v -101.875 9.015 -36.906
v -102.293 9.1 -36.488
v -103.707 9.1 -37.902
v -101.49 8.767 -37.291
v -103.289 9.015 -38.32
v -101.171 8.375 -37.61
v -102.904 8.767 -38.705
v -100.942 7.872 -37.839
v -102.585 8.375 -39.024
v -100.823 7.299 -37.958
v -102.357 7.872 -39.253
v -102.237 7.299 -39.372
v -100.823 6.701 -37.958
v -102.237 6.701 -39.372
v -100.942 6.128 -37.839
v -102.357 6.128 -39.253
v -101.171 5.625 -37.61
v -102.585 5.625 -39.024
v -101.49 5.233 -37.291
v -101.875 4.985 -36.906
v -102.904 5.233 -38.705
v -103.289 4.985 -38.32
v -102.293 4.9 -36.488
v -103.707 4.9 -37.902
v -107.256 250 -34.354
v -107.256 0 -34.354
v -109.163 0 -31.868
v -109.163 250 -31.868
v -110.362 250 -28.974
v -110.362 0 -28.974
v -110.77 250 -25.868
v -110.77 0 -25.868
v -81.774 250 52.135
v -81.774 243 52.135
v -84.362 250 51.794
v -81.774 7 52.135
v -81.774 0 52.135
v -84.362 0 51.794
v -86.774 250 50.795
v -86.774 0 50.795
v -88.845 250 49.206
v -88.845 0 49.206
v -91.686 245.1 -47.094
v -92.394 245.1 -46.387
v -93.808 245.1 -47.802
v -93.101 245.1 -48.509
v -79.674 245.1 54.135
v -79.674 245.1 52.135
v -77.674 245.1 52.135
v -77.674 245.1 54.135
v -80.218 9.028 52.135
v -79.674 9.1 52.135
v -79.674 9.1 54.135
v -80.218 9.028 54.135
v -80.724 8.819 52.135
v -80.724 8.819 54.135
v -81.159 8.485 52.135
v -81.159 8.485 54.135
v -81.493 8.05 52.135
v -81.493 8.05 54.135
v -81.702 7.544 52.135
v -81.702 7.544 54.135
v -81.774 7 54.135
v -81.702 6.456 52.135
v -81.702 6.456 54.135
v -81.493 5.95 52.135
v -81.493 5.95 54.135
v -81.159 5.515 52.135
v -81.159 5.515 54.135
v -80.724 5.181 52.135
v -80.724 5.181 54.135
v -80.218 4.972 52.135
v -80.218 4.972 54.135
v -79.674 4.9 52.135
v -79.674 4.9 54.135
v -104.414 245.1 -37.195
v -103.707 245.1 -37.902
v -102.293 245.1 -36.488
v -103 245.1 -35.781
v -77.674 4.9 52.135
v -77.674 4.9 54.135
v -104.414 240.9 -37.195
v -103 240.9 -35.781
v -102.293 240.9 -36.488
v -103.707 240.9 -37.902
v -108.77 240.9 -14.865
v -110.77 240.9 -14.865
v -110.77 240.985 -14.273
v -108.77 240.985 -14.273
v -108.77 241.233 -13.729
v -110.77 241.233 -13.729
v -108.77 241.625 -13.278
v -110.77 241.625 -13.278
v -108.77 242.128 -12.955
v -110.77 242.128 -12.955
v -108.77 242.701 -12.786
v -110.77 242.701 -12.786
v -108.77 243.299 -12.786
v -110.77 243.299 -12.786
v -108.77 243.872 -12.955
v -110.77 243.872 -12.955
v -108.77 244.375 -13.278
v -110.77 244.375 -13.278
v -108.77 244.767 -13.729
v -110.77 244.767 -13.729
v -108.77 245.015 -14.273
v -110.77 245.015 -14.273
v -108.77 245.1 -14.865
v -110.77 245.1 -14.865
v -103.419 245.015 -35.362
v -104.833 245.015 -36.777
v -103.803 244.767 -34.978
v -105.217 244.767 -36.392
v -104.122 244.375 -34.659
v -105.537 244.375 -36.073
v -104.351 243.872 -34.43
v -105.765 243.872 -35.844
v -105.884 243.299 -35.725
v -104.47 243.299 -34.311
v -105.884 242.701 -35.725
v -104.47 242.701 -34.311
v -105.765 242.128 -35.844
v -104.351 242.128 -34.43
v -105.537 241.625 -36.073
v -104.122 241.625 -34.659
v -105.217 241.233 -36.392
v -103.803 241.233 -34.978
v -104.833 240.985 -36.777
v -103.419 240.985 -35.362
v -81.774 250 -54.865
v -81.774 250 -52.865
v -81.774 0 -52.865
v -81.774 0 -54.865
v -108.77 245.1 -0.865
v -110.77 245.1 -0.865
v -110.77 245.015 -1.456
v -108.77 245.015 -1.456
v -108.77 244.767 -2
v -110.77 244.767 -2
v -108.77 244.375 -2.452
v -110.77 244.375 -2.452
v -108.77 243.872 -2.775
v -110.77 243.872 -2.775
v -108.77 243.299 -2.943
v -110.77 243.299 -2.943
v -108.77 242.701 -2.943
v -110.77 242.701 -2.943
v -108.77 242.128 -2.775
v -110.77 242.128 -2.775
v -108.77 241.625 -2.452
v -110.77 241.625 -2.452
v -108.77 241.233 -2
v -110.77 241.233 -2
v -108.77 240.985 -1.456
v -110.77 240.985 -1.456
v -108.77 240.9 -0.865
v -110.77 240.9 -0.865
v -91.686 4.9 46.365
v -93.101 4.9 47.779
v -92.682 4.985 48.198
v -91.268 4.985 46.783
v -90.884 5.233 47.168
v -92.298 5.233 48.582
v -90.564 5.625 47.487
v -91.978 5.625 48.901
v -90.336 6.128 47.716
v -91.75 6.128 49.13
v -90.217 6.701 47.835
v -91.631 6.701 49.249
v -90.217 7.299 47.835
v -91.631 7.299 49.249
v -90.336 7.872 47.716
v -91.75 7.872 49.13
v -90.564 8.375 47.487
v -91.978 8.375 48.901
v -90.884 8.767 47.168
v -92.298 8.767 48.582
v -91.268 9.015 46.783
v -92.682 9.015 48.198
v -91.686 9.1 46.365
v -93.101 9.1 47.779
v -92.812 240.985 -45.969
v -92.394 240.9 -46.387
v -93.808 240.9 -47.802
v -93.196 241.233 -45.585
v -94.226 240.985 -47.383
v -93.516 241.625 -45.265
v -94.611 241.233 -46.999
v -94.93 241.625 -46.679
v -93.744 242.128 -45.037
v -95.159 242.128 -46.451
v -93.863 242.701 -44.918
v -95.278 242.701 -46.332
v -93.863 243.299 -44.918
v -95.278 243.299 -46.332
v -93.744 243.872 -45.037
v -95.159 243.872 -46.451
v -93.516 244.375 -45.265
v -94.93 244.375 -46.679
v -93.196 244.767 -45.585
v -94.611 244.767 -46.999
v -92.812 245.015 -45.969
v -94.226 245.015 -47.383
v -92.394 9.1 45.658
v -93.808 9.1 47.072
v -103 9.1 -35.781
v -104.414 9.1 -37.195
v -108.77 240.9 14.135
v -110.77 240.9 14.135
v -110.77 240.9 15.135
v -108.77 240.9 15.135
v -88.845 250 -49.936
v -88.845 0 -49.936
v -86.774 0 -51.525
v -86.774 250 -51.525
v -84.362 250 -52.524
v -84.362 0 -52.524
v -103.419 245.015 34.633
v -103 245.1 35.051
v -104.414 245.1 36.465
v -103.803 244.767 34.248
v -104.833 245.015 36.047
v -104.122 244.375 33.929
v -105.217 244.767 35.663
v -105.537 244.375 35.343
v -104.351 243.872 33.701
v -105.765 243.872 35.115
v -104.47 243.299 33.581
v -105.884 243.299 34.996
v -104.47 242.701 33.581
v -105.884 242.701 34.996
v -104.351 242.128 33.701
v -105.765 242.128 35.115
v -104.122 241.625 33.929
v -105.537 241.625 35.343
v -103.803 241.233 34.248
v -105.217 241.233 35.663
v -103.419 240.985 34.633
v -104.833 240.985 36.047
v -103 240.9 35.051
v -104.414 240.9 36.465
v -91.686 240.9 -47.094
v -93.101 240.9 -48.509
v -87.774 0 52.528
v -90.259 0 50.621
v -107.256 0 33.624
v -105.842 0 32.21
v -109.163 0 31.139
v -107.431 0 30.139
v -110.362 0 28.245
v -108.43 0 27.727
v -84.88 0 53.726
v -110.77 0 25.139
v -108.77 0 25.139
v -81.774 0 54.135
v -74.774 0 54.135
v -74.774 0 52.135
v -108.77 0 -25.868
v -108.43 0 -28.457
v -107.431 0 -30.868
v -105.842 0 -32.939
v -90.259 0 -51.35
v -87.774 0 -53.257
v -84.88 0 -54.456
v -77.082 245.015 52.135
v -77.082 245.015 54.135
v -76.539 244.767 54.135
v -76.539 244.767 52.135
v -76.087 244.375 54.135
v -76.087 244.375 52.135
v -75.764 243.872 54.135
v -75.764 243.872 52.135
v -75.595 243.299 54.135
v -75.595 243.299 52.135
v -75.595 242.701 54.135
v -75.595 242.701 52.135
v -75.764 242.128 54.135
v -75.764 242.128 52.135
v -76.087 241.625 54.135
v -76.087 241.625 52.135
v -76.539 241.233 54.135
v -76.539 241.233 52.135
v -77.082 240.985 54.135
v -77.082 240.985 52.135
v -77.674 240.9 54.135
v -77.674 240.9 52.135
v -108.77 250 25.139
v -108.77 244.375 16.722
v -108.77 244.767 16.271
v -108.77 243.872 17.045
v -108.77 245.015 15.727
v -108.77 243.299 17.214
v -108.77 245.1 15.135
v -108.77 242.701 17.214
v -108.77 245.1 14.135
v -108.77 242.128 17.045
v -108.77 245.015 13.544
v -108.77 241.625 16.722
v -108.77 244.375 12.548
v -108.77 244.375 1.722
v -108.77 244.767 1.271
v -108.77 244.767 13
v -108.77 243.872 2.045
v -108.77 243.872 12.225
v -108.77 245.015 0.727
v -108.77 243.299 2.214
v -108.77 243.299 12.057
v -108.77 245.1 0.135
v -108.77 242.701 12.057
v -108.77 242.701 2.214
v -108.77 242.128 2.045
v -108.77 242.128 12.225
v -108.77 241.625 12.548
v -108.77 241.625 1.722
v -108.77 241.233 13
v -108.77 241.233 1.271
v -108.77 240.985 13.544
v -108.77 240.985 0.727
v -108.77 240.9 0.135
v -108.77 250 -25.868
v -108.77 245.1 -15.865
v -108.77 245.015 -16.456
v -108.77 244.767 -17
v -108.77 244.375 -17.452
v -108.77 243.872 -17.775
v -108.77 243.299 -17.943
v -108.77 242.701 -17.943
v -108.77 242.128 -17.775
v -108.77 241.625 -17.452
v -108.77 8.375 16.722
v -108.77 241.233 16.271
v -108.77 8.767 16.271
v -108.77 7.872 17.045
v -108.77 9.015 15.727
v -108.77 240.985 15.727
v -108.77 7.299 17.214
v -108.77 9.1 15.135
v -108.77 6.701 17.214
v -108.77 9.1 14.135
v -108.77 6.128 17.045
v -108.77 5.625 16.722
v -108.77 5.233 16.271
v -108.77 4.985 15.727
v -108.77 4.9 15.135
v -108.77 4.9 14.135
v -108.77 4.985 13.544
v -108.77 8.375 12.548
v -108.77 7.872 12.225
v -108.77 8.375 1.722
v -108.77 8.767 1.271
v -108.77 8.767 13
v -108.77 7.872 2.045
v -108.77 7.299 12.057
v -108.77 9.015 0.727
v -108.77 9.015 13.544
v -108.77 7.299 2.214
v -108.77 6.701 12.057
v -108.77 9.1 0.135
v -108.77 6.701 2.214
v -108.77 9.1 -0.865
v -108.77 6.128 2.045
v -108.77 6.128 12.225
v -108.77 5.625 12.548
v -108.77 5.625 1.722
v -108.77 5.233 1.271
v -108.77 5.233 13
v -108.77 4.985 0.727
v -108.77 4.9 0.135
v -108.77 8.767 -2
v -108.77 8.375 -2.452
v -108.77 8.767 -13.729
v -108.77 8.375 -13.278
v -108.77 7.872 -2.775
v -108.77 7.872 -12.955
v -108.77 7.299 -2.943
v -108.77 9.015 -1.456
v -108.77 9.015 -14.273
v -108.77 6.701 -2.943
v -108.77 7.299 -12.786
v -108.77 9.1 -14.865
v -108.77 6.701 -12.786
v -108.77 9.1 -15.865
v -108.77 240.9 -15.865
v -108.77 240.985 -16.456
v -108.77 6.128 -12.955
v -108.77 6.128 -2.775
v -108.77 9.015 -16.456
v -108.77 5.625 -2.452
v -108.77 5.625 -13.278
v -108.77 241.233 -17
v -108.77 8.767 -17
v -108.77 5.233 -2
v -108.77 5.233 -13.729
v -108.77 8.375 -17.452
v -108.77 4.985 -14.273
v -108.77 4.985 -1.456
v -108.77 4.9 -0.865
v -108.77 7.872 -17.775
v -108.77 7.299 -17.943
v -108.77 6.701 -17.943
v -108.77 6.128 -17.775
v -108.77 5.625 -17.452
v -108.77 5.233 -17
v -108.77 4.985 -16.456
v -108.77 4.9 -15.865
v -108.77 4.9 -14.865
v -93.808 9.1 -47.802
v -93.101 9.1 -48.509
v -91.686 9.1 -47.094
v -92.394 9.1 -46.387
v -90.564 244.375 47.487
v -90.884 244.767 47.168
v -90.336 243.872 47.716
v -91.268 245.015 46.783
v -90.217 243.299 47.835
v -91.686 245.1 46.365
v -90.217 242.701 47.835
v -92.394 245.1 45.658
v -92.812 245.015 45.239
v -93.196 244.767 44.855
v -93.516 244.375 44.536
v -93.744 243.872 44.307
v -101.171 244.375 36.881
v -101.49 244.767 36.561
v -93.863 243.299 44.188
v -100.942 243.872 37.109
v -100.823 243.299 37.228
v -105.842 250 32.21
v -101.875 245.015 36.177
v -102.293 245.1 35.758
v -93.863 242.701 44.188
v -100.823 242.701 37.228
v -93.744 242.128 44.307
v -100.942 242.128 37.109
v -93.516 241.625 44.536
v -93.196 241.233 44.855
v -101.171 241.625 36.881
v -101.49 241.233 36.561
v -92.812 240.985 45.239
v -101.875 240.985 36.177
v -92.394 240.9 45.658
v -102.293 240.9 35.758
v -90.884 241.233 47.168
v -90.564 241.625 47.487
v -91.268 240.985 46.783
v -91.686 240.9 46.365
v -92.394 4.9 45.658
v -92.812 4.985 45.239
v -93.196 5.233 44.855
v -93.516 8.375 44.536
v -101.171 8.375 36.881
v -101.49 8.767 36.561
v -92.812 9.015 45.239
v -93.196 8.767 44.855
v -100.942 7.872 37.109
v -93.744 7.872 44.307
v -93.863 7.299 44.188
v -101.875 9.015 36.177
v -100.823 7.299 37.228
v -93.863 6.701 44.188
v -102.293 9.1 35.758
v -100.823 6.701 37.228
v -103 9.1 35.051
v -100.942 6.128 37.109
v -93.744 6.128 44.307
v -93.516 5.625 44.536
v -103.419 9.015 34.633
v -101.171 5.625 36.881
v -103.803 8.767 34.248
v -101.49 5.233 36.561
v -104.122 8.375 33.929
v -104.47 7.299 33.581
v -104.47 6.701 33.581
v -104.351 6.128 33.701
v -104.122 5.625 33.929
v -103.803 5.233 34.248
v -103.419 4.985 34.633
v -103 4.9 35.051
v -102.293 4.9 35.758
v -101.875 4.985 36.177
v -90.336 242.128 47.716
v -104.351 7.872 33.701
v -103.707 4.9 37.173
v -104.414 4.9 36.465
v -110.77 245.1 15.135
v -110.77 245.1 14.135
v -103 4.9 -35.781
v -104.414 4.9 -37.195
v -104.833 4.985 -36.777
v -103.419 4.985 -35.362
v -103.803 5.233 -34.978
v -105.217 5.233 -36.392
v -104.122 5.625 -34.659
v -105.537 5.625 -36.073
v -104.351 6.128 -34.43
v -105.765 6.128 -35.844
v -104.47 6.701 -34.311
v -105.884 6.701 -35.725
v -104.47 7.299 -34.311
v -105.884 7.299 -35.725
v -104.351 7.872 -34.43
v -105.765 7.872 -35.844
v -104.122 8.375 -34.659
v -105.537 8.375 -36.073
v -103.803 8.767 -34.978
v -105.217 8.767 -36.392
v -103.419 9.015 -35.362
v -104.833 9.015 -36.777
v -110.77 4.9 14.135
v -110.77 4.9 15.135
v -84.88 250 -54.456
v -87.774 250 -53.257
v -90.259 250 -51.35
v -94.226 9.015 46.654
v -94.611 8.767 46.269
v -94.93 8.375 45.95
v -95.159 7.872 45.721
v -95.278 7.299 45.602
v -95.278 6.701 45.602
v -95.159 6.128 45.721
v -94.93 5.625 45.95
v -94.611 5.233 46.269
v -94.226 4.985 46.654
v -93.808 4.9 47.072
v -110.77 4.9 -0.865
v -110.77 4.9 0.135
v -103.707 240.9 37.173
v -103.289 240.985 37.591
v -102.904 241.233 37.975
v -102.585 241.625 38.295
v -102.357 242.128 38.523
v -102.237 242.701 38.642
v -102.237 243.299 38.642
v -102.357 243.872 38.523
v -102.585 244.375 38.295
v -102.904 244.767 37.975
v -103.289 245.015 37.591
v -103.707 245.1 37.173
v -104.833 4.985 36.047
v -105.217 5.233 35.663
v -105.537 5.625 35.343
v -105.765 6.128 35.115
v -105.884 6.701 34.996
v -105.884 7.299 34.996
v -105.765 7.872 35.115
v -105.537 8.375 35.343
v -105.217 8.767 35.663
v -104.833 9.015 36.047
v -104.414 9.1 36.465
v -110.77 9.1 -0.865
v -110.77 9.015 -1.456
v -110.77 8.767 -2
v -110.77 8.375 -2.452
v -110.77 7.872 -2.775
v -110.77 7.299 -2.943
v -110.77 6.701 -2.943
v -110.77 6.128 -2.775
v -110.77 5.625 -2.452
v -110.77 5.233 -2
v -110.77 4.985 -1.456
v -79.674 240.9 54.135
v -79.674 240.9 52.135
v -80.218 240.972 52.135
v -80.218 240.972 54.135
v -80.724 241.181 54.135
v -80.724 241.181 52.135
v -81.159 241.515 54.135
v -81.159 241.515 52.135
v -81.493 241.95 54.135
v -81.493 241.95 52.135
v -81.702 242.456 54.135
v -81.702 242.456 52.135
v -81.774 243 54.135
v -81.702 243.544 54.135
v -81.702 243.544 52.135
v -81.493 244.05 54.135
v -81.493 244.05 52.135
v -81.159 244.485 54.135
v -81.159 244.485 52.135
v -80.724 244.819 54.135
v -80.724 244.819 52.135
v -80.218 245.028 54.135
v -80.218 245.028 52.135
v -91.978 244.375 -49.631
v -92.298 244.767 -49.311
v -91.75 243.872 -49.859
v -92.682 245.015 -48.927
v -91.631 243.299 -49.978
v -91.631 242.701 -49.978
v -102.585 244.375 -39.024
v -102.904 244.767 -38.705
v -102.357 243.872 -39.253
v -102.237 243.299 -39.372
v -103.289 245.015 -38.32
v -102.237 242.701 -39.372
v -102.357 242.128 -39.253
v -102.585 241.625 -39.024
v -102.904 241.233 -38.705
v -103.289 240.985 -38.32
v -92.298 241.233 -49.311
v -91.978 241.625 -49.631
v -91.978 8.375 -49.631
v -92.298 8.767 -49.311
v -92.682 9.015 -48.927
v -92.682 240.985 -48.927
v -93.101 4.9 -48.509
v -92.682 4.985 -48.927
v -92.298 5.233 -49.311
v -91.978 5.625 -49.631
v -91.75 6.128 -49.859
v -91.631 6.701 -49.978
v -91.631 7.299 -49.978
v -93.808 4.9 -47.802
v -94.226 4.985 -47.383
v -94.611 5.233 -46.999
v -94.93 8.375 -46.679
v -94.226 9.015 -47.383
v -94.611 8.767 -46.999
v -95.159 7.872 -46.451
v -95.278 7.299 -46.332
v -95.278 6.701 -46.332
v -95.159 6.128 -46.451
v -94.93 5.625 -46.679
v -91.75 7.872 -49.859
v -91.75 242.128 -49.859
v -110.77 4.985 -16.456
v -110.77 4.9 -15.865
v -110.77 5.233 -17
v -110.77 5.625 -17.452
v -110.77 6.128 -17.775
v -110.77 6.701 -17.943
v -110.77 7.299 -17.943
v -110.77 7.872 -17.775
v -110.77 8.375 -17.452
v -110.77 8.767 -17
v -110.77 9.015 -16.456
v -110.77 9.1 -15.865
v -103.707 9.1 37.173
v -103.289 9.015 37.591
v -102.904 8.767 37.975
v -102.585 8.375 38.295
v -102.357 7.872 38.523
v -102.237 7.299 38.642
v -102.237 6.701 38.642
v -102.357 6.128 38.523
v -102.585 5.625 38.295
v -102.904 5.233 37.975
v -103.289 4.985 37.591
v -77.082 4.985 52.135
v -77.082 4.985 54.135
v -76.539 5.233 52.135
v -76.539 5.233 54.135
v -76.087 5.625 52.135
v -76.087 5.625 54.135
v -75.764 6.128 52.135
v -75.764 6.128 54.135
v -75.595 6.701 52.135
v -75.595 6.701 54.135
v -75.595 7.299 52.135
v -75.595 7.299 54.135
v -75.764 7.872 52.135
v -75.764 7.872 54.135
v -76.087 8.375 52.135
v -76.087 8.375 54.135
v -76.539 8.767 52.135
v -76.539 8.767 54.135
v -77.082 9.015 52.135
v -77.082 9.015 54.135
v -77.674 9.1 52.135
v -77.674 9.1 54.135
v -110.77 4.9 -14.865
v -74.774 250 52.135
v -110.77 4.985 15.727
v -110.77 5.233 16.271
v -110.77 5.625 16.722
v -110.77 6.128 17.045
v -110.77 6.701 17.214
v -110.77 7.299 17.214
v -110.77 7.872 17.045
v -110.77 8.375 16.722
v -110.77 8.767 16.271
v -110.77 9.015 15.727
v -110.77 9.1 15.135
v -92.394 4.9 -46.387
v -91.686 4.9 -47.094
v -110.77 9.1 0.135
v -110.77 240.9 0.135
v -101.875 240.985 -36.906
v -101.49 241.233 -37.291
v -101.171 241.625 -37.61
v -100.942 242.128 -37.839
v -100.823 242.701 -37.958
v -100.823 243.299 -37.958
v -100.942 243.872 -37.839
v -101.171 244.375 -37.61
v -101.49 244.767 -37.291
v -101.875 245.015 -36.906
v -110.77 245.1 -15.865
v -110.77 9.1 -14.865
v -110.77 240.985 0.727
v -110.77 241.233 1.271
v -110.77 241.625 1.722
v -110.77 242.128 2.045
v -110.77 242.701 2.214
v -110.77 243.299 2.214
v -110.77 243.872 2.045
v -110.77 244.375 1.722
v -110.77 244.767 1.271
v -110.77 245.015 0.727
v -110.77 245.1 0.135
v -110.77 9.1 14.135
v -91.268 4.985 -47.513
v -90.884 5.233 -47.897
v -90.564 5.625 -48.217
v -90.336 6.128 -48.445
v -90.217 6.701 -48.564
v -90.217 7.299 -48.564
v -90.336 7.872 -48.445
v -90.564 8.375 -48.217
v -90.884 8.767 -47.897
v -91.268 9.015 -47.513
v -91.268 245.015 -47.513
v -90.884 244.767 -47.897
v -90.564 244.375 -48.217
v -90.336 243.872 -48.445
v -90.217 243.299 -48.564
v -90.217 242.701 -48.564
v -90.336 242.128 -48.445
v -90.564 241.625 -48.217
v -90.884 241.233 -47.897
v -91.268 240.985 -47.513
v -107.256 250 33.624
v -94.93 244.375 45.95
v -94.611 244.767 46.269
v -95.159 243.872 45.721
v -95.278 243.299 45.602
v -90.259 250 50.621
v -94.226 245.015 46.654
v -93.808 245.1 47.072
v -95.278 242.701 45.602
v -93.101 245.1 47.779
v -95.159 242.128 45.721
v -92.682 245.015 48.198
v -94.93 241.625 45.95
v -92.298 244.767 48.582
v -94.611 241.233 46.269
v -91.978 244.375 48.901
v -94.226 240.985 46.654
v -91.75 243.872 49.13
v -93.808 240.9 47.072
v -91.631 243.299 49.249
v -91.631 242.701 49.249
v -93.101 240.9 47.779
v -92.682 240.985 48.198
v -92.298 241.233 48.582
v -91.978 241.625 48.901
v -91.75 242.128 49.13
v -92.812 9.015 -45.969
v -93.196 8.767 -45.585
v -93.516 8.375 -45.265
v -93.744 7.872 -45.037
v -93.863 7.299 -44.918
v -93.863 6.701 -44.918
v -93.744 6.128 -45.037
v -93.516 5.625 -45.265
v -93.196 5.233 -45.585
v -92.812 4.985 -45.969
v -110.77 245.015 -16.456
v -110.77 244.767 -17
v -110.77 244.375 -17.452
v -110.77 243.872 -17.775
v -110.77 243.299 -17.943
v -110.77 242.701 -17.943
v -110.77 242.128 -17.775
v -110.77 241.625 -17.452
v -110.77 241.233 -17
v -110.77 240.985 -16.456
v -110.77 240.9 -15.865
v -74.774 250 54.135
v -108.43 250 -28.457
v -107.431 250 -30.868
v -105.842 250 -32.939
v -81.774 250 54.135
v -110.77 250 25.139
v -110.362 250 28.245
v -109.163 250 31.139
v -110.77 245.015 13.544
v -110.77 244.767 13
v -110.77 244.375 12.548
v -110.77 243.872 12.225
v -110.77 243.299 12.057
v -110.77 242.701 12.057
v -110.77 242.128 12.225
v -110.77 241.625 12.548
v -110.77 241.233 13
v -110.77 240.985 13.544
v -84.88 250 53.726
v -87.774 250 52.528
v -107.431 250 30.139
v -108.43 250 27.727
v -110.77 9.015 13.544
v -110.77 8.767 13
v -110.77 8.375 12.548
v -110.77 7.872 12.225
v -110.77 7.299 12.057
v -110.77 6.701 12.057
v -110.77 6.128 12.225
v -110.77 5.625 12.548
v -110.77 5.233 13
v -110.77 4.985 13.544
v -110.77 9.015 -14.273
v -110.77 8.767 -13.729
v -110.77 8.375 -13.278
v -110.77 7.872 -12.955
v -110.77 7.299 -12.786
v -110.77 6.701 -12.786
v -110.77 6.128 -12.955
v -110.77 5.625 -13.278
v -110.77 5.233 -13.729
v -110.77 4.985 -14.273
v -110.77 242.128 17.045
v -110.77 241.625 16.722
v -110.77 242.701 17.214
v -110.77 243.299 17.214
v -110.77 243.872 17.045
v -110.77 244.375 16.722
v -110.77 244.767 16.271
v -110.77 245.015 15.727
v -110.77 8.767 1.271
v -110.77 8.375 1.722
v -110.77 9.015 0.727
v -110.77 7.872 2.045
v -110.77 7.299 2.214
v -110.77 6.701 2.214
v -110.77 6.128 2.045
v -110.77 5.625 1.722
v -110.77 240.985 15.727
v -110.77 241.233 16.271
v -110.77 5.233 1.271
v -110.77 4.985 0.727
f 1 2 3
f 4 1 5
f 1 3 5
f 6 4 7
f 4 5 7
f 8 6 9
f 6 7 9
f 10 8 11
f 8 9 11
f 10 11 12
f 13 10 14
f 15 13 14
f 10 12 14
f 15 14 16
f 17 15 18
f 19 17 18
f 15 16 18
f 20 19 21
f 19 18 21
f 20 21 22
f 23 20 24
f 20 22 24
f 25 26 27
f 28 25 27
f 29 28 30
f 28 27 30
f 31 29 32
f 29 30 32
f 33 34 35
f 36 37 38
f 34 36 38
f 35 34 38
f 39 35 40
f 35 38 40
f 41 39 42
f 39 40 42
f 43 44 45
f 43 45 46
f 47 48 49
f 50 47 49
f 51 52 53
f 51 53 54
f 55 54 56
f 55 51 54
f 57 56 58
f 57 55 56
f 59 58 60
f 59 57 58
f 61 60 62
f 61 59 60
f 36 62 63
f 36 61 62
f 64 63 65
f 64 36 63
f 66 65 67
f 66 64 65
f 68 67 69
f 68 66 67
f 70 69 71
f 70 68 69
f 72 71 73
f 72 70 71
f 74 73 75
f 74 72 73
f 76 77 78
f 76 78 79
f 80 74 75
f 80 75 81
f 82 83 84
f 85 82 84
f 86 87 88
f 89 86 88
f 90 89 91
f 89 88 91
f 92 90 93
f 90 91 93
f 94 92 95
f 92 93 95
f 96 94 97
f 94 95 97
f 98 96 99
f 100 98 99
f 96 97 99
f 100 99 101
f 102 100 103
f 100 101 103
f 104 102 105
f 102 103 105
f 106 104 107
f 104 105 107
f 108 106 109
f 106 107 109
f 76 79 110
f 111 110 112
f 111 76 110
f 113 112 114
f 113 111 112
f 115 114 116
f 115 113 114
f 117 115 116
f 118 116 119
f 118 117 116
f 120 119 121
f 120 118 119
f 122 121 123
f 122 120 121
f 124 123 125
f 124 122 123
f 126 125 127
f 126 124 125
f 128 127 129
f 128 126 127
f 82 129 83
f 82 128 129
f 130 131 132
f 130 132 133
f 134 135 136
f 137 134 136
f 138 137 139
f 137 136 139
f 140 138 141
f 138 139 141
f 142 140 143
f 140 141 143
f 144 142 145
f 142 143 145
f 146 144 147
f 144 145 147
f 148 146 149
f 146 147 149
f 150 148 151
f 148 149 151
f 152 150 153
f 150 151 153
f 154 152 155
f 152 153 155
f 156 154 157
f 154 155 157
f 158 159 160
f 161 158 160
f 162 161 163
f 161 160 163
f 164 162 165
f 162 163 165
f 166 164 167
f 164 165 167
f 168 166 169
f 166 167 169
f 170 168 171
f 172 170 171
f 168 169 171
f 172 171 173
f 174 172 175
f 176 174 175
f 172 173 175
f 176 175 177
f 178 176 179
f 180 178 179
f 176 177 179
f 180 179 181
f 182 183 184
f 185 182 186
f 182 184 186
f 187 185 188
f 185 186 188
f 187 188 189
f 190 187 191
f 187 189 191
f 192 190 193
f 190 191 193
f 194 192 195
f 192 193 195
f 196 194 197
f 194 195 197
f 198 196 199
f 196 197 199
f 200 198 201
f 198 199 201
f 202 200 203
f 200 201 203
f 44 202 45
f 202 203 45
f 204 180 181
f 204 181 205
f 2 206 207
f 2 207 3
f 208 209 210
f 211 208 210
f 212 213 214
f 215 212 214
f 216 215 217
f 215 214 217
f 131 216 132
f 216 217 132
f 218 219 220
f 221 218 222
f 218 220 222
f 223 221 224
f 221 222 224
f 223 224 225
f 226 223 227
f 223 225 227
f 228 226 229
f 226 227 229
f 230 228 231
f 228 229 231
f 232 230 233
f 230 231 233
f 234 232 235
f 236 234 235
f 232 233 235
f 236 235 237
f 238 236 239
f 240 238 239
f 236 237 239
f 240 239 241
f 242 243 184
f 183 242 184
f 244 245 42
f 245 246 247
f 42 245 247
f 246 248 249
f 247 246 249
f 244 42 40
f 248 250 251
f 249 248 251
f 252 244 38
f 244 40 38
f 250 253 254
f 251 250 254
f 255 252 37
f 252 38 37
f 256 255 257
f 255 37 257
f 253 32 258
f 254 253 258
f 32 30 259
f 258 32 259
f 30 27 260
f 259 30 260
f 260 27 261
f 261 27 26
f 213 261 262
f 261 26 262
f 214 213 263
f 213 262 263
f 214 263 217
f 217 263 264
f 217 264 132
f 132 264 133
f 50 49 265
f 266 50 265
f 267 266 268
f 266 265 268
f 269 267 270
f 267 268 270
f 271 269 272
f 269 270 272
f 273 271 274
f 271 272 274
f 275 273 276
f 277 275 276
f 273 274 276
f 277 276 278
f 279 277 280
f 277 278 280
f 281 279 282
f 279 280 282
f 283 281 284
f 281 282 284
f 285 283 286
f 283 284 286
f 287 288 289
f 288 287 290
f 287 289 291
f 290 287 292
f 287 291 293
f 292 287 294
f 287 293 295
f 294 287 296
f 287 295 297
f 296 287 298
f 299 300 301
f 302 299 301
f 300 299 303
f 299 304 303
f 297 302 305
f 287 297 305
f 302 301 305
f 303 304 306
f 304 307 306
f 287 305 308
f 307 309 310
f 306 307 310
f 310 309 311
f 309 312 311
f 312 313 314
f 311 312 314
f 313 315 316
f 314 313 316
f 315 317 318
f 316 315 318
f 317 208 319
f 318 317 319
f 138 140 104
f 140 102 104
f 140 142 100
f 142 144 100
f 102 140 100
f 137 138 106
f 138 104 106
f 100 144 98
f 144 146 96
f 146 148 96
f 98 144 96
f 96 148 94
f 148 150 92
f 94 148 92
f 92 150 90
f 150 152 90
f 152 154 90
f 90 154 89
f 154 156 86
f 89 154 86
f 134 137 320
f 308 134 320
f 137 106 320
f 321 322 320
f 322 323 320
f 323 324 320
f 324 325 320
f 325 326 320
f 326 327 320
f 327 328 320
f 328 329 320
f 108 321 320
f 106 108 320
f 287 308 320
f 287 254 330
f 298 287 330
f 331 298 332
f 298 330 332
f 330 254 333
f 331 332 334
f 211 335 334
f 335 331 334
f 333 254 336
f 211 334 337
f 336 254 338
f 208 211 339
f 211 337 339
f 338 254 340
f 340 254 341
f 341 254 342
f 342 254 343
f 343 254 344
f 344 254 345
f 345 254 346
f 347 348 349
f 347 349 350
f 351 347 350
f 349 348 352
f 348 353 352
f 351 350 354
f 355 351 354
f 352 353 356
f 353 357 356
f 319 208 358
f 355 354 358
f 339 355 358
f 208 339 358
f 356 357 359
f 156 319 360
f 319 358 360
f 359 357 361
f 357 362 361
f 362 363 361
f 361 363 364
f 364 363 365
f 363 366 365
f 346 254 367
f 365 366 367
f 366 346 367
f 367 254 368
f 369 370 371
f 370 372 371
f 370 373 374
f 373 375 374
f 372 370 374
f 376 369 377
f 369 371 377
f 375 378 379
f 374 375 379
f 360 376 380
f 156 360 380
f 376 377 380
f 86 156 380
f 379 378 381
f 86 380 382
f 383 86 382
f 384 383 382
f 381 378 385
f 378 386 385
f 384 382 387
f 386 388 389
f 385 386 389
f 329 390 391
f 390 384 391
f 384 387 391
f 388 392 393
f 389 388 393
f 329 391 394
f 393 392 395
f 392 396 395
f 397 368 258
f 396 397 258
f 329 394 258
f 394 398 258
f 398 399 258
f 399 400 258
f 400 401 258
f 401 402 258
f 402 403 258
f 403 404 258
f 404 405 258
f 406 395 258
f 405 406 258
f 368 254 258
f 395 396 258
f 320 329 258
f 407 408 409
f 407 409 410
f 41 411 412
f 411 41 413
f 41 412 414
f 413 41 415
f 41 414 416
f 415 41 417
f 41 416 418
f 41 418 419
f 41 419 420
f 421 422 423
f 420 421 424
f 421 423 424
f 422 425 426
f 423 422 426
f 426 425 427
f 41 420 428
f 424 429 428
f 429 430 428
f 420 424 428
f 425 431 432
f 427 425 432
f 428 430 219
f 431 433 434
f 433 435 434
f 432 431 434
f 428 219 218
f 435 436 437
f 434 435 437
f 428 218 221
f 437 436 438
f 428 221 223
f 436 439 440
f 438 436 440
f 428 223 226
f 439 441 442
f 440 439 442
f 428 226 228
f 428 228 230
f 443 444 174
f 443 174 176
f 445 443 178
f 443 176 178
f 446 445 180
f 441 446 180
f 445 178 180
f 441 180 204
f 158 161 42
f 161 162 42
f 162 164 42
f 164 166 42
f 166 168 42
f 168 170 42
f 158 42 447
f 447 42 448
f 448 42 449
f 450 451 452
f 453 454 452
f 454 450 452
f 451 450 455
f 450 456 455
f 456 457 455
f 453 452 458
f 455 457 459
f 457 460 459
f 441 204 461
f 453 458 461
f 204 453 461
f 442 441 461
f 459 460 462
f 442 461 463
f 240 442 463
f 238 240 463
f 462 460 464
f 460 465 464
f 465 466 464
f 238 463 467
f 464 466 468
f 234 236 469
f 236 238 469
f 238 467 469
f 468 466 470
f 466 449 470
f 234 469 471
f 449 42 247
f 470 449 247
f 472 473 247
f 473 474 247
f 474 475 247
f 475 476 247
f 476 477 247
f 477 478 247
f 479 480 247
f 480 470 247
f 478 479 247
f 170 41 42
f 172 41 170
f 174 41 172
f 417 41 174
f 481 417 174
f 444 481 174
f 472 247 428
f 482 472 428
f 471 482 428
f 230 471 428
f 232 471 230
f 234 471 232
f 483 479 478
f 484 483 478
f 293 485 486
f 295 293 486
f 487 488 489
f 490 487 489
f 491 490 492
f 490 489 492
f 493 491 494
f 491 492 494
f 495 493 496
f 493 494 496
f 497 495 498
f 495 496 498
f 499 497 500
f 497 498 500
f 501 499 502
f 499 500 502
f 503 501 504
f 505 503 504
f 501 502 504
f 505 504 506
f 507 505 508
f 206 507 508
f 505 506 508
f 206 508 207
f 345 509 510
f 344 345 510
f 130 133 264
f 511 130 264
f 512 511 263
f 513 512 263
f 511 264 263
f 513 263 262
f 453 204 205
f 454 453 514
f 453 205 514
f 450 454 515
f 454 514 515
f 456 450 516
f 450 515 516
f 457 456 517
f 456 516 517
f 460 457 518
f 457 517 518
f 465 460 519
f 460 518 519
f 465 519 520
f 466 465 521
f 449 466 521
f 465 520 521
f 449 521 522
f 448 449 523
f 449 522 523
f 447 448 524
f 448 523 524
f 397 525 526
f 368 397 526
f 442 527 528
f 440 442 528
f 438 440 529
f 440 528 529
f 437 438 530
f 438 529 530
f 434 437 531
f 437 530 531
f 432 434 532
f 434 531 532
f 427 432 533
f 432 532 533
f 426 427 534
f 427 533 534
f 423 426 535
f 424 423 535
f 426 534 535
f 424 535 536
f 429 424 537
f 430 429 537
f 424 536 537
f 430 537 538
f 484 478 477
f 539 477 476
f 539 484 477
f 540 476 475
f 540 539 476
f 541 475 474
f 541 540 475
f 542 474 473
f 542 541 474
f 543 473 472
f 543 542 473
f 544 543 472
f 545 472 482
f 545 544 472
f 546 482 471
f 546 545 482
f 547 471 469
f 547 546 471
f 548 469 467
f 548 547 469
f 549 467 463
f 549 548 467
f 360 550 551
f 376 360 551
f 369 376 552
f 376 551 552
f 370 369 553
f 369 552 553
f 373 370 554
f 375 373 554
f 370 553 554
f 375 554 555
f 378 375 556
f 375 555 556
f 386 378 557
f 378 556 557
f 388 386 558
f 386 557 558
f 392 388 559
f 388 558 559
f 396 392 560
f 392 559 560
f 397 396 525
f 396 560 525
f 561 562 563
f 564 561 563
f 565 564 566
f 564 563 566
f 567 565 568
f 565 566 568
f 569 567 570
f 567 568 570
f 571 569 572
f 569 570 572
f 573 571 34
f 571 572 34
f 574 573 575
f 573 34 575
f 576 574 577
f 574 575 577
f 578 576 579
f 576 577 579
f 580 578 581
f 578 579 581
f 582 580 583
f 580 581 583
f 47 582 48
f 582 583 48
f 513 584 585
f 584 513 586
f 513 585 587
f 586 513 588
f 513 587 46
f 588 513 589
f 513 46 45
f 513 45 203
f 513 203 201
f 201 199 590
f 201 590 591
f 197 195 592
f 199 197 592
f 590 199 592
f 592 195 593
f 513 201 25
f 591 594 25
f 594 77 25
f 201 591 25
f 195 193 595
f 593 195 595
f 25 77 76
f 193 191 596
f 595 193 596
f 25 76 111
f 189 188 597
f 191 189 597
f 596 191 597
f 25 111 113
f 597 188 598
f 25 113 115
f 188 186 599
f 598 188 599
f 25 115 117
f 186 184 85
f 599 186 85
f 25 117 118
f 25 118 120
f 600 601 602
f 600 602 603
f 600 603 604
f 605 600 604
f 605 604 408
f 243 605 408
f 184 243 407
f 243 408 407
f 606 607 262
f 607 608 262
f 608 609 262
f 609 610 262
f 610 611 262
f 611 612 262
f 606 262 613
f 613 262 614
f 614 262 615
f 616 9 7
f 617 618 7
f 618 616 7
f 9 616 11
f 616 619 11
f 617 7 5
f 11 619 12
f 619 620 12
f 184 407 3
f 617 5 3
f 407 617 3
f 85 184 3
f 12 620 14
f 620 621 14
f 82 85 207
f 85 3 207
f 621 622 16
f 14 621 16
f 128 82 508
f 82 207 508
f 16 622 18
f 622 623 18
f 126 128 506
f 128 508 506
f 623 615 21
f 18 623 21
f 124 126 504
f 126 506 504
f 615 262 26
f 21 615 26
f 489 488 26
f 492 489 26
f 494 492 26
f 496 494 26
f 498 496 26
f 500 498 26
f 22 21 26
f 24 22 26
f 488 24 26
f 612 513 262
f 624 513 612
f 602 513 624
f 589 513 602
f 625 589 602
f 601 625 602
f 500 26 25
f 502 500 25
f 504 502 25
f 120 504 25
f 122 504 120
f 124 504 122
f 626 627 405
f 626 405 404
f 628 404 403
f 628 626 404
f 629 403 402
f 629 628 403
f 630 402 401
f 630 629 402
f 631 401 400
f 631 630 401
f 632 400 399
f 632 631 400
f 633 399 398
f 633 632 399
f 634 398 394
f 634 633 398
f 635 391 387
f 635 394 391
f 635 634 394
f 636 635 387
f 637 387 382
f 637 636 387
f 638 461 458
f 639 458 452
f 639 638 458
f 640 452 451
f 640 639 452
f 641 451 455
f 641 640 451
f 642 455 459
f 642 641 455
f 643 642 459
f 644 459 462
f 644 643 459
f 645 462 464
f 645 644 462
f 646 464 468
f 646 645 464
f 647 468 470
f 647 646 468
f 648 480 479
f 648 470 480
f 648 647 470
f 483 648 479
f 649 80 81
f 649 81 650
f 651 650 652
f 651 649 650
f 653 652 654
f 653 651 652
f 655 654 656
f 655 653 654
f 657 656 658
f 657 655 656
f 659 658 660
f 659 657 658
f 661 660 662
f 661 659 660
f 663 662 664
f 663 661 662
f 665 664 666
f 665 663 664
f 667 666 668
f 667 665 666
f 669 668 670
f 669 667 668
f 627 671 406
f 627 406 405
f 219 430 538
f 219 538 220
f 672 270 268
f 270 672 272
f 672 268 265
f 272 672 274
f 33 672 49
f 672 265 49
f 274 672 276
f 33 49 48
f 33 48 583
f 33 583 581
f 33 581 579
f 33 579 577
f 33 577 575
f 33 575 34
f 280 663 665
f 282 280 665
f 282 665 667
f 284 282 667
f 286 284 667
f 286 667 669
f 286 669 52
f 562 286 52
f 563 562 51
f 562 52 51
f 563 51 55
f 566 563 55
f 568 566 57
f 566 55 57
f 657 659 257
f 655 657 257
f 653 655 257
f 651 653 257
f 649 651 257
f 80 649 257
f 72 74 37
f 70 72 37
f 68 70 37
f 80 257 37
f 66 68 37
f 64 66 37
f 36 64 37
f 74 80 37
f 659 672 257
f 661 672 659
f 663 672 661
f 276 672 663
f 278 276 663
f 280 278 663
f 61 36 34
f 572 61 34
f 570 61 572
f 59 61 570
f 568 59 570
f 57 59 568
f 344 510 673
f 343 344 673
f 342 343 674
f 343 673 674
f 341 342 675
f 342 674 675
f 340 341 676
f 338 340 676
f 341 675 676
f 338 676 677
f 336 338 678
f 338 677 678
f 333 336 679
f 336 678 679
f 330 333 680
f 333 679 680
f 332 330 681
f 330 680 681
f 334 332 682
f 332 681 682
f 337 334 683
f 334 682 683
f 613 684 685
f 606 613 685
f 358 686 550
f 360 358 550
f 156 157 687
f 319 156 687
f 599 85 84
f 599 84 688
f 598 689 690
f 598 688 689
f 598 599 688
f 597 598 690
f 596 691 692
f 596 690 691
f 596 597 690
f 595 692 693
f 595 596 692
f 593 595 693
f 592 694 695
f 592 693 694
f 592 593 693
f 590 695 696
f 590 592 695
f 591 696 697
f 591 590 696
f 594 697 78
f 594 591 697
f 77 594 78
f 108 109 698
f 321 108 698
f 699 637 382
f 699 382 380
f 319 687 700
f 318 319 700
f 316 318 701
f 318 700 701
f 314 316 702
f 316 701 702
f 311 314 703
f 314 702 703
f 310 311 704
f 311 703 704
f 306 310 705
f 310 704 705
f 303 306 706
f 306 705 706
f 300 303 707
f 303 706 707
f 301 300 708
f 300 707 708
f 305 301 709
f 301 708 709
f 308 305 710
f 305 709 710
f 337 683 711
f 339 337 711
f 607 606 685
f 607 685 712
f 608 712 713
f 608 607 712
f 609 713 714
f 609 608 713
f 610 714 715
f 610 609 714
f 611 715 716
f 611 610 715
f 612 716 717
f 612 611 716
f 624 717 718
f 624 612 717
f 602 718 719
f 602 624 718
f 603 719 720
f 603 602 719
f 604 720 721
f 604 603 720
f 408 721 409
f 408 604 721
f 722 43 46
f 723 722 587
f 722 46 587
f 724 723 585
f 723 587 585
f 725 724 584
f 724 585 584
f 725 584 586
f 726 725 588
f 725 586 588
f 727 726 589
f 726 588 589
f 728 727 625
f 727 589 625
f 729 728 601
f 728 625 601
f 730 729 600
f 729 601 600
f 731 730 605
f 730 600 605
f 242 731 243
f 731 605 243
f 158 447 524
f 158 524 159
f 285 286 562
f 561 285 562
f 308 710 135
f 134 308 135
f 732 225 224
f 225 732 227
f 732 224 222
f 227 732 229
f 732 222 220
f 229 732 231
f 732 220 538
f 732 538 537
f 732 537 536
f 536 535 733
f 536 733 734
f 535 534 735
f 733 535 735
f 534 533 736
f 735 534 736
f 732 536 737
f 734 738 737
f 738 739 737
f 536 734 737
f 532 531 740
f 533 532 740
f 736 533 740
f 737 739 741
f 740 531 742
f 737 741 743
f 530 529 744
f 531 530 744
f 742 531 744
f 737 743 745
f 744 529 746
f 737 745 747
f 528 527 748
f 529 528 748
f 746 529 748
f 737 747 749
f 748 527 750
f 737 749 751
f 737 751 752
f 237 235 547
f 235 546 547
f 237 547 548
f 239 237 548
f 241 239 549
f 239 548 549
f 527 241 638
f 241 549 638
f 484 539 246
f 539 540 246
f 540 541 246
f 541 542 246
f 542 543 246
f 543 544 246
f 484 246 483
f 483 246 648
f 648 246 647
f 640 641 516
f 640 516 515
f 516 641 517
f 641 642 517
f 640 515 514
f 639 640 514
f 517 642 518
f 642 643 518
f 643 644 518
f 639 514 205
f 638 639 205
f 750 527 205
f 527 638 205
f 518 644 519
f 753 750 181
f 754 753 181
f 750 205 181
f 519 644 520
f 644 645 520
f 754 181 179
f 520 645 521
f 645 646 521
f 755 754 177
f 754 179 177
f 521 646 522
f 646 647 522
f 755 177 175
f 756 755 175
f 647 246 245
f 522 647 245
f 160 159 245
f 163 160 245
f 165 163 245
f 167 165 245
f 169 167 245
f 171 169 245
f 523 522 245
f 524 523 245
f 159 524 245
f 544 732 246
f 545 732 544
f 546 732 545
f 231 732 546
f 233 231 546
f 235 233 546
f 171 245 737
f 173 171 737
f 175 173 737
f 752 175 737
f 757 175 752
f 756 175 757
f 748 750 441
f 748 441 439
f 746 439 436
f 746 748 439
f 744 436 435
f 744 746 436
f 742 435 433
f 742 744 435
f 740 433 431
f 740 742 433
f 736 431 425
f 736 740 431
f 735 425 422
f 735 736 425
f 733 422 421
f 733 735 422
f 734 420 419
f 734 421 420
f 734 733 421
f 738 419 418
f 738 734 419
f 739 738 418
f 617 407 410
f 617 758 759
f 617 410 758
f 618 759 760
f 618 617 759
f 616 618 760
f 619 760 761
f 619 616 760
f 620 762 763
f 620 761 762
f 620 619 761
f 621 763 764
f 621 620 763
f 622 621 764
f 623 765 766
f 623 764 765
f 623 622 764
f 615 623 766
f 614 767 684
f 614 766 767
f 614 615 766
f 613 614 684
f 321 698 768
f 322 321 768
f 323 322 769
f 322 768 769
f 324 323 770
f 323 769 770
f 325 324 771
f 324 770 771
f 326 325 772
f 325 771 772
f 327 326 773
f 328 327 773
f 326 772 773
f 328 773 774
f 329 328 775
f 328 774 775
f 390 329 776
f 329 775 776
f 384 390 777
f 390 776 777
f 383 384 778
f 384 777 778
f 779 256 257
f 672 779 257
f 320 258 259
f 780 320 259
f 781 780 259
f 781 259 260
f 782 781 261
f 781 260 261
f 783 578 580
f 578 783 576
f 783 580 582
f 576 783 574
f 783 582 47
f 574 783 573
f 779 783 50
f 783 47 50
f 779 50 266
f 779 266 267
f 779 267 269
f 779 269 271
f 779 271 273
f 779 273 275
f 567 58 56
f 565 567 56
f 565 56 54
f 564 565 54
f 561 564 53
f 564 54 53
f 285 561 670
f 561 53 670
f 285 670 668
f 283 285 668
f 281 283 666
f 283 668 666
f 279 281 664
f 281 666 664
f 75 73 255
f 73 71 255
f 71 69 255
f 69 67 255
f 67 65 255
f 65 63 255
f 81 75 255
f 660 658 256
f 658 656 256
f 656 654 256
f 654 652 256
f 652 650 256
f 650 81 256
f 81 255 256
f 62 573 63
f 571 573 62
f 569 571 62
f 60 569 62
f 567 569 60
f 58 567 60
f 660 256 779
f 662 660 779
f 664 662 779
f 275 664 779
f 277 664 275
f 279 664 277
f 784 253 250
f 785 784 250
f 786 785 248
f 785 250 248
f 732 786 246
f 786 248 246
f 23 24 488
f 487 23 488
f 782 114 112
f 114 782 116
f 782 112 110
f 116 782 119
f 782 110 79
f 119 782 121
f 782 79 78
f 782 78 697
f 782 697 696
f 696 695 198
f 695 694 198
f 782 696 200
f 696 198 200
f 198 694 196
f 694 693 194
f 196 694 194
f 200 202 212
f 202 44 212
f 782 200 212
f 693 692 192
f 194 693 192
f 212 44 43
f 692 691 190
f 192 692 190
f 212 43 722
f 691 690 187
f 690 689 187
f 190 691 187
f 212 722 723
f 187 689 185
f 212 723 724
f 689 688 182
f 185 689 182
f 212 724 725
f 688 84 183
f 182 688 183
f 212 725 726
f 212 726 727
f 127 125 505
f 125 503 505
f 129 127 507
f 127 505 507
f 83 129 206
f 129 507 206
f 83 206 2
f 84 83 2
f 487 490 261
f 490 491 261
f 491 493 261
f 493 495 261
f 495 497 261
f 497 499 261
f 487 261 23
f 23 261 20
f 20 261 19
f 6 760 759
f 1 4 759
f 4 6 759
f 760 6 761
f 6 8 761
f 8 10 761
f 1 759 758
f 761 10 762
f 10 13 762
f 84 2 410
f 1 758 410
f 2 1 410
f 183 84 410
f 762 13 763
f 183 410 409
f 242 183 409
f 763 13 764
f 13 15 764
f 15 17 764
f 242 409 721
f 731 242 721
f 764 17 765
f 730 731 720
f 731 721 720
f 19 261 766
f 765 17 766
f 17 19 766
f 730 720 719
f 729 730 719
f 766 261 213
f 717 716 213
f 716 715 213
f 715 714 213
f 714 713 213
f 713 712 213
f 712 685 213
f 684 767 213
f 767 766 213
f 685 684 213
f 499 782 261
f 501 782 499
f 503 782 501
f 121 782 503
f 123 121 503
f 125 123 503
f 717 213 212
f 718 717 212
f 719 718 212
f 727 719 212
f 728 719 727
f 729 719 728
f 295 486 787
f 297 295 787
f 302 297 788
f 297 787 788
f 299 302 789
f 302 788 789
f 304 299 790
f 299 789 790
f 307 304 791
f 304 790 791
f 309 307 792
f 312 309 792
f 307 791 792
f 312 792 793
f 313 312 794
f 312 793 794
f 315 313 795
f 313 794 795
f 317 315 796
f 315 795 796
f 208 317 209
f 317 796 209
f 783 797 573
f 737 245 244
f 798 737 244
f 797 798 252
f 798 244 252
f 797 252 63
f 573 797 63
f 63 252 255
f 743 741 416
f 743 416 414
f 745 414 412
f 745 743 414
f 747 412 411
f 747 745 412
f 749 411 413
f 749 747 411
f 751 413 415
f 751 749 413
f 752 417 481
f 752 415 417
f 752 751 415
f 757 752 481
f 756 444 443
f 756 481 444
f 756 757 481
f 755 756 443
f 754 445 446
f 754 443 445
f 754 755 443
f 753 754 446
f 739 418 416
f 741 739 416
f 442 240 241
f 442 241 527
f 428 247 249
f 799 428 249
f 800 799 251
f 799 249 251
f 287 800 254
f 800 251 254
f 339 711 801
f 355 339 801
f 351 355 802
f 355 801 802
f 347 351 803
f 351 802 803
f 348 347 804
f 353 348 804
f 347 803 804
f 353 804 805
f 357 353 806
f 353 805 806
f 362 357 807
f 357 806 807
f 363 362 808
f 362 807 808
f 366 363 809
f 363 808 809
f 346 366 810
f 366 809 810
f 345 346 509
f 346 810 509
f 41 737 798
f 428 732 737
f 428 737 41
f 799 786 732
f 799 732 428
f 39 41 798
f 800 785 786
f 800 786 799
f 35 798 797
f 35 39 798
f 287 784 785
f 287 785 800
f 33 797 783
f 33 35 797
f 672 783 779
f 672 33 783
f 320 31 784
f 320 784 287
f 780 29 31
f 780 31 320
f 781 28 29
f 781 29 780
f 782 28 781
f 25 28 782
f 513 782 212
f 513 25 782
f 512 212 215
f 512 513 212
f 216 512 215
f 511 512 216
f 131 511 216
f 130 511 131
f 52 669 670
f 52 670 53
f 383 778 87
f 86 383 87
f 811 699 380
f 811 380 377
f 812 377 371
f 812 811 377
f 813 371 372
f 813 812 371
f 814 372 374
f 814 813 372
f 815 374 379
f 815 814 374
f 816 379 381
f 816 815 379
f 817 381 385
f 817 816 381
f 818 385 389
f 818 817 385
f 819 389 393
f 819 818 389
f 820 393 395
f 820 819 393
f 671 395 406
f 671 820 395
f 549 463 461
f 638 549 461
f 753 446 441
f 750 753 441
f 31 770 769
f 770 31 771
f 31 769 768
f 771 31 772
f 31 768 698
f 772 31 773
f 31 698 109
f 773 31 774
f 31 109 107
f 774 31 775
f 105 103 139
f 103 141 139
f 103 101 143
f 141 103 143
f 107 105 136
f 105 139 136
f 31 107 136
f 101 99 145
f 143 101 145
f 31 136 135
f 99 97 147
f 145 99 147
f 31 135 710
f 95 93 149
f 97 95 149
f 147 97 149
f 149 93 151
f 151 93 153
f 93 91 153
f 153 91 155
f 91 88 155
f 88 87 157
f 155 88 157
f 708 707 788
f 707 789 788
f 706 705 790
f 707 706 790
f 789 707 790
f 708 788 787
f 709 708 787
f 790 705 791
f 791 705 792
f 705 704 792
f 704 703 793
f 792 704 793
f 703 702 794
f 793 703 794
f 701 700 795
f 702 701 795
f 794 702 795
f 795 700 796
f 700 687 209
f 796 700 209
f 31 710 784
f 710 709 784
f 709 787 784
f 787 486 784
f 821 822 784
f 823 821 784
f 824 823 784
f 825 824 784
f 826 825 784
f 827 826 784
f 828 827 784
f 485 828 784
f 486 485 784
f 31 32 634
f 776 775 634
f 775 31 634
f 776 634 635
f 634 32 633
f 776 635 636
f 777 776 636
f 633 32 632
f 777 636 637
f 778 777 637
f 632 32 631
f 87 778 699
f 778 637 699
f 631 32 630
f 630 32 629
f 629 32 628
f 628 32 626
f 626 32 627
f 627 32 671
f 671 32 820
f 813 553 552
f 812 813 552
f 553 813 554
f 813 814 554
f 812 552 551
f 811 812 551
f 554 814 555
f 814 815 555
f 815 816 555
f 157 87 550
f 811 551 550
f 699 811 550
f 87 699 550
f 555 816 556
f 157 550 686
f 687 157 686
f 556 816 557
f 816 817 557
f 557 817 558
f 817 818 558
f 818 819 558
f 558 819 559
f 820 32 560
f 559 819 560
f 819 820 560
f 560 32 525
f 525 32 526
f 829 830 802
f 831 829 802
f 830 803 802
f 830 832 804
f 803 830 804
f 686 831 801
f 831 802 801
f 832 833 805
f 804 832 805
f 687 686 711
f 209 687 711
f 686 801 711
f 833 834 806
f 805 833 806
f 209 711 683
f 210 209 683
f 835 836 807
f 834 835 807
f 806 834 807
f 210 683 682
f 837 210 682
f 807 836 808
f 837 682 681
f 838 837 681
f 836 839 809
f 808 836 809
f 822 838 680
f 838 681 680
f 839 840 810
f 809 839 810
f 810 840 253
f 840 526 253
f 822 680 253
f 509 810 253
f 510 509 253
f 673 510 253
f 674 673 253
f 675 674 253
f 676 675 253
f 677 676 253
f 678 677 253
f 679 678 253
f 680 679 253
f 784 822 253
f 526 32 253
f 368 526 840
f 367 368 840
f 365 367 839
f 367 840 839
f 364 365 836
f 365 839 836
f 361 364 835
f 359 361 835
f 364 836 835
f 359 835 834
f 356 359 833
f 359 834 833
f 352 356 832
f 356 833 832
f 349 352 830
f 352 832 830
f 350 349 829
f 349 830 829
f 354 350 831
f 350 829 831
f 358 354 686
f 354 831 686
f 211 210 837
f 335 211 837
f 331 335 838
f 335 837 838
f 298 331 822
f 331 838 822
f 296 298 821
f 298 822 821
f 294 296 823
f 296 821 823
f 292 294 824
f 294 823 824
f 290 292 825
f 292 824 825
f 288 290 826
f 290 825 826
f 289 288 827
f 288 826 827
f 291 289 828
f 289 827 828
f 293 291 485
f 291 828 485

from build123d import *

# Parameters (mm, degrees)
EXTRUDE_1_DEPTH      = 250
CUT_EXTRUDE_2_DEPTH  = 250
CUT_EXTRUDE_4_DEPTH  = 250
CUT_EXTRUDE_5_DEPTH  = 250
CUT_EXTRUDE_6_DEPTH  = 250
SKETCH_12_W          = 2
SKETCH_12_H          = 250
CUT_EXTRUDE_11_DEPTH = 7


with BuildPart() as part:
    # 草图2 → 凸台-拉伸1 (new body)
    with BuildSketch(Plane(origin=(0, 0, 0), x_dir=(1, 0, 0), z_dir=(0, 1, 0))):
        with BuildLine():
            Line((-74.774044662, 52.864763338), (-74.774044662, 54.864763338))
            Line((-74.774044662, 54.864763338), (-81.774044662, 54.864763338))
            ThreePointArc((-81.774044662, 54.864763338), (-86.36624585, 53.951317728), (-90.259326036, 51.350044712))
            Line((-90.259326036, 51.350044712), (-107.255754699, 34.35361605))
            ThreePointArc((-107.255754699, 34.35361605), (-109.857027714, 30.460535864), (-110.770473324, 25.868334675))
            Line((-110.770473324, 25.868334675), (-110.770473324, -25.138808))
            ThreePointArc((-110.770473324, -25.138808), (-109.857027714, -29.731009188), (-107.255754699, -33.624089374))
            Line((-107.255754699, -33.624089374), (-90.259326036, -50.620518036))
            ThreePointArc((-90.259326036, -50.620518036), (-86.36624585, -53.221791052), (-81.774044662, -54.135236662))
            Line((-81.774044662, -54.135236662), (-74.774044662, -54.135236662))
            Line((-74.774044662, -54.135236662), (-74.774044662, -52.135236662))
            Line((-74.774044662, -52.135236662), (-81.774044662, -52.135236662))
            ThreePointArc((-81.774044662, -52.135236662), (-85.600878985, -51.374031987), (-88.845112474, -49.206304474))
            Line((-88.845112474, -49.206304474), (-105.841541136, -32.209875812))
            ThreePointArc((-105.841541136, -32.209875812), (-108.009268649, -28.965642323), (-108.770473324, -25.138808))
            Line((-108.770473324, -25.138808), (-108.770473324, 25.868334675))
            ThreePointArc((-108.770473324, 25.868334675), (-108.009268649, 29.695168999), (-105.841541136, 32.939402487))
            Line((-105.841541136, 32.939402487), (-88.845112474, 49.93583115))
            ThreePointArc((-88.845112474, 49.93583115), (-85.600878985, 52.103558663), (-81.774044662, 52.864763338))
            Line((-81.774044662, 52.864763338), (-74.774044662, 52.864763338))
        make_face()
    extrude(amount=EXTRUDE_1_DEPTH)

    # 草图3 → 切除-拉伸2 (cut)
    with BuildSketch(Plane(origin=(0, 0, -54.864763338), x_dir=(-1, 0, 0), z_dir=(0, 0, -1))):
        with BuildLine():
            ThreePointArc((79.674044662, 240.9), (81.774044662, 243), (79.674044662, 245.1))
            Line((79.674044662, 245.1), (77.674044662, 245.1))
            ThreePointArc((77.674044662, 245.1), (75.574044662, 243), (77.674044662, 240.9))
            Line((77.674044662, 240.9), (79.674044662, 240.9))
        make_face()
        with BuildLine():
            ThreePointArc((79.674044662, 9.1), (81.774044662, 7), (79.674044662, 4.9))
            Line((79.674044662, 4.9), (77.674044662, 4.9))
            ThreePointArc((77.674044662, 4.9), (75.574044662, 7), (77.674044662, 9.1))
            Line((77.674044662, 9.1), (79.674044662, 9.1))
        make_face()
    extrude(amount=-CUT_EXTRUDE_2_DEPTH, mode=Mode.SUBTRACT)

    # 草图4 → 切除-拉伸4 (cut)
    with BuildSketch(Plane(origin=(-70.804685374, 0, -70.804685374), x_dir=(-0.7071067811865558, 0, 0.7071067811865392), z_dir=(-0.7071067811865392, 0, -0.7071067811865558))):
        with BuildLine():
            Line((31.531306639, 9.1), (32.531306639, 9.1))
            ThreePointArc((32.531306639, 9.1), (34.631306639, 7), (32.531306639, 4.9))
            Line((32.531306639, 4.9), (31.531306639, 4.9))
            ThreePointArc((31.531306639, 4.9), (29.431306639, 7), (31.531306639, 9.1))
        make_face()
        with BuildLine():
            Line((47.531306639, 9.1), (46.531306639, 9.1))
            ThreePointArc((46.531306639, 9.1), (44.431306639, 7), (46.531306639, 4.9))
            Line((46.531306639, 4.9), (47.531306639, 4.9))
            ThreePointArc((47.531306639, 4.9), (49.631306639, 7), (47.531306639, 9.1))
        make_face()
        with BuildLine():
            Line((47.531306639, 240.9), (46.531306639, 240.9))
            ThreePointArc((46.531306639, 240.9), (44.431306639, 243), (46.531306639, 245.1))
            Line((46.531306639, 245.1), (47.531306639, 245.1))
            ThreePointArc((47.531306639, 245.1), (49.631306639, 243), (47.531306639, 240.9))
        make_face()
        with BuildLine():
            Line((31.531306639, 240.9), (32.531306639, 240.9))
            ThreePointArc((32.531306639, 240.9), (34.631306639, 243), (32.531306639, 245.1))
            Line((32.531306639, 245.1), (31.531306639, 245.1))
            ThreePointArc((31.531306639, 245.1), (29.431306639, 243), (31.531306639, 240.9))
        make_face()
    extrude(amount=-CUT_EXTRUDE_4_DEPTH, mode=Mode.SUBTRACT)

    # 草图5 → 切除-拉伸5 (cut)
    with BuildSketch(Plane(origin=(-70.439922036, 0, 70.439922036), x_dir=(0.7071067811865507, 0, 0.7071067811865445), z_dir=(-0.7071067811865445, 0, 0.7071067811865507))):
        with BuildLine():
            Line((-48.047159898, 9.1), (-47.047159898, 9.1))
            ThreePointArc((-47.047159898, 9.1), (-44.947159898, 7), (-47.047159898, 4.9))
            Line((-47.047159898, 4.9), (-48.047159898, 4.9))
            ThreePointArc((-48.047159898, 4.9), (-50.147159898, 7), (-48.047159898, 9.1))
        make_face()
        with BuildLine():
            Line((-32.047159898, 9.1), (-33.047159898, 9.1))
            ThreePointArc((-33.047159898, 9.1), (-35.147159898, 7), (-33.047159898, 4.9))
            Line((-33.047159898, 4.9), (-32.047159898, 4.9))
            ThreePointArc((-32.047159898, 4.9), (-29.947159898, 7), (-32.047159898, 9.1))
        make_face()
        with BuildLine():
            Line((-32.047159898, 240.9), (-33.047159898, 240.9))
            ThreePointArc((-33.047159898, 240.9), (-35.147159898, 243), (-33.047159898, 245.1))
            Line((-33.047159898, 245.1), (-32.047159898, 245.1))
            ThreePointArc((-32.047159898, 245.1), (-29.947159898, 243), (-32.047159898, 240.9))
        make_face()
        with BuildLine():
            Line((-48.047159898, 240.9), (-47.047159898, 240.9))
            ThreePointArc((-47.047159898, 240.9), (-44.947159898, 243), (-47.047159898, 245.1))
            Line((-47.047159898, 245.1), (-48.047159898, 245.1))
            ThreePointArc((-48.047159898, 245.1), (-50.147159898, 243), (-48.047159898, 240.9))
        make_face()
    extrude(amount=-CUT_EXTRUDE_5_DEPTH, mode=Mode.SUBTRACT)

    # 草图6 → 切除-拉伸6 (cut)
    with BuildSketch(Plane.ZY.offset(110.770473324)):
        with BuildLine():
            Line((-15.864763338, 9.1), (-14.864763338, 9.1))
            ThreePointArc((-14.864763338, 9.1), (-12.764763338, 7), (-14.864763338, 4.9))
            Line((-14.864763338, 4.9), (-15.864763338, 4.9))
            ThreePointArc((-15.864763338, 4.9), (-17.964763338, 7), (-15.864763338, 9.1))
        make_face()
        with BuildLine():
            Line((-0.864763338, 4.9), (0.135236662, 4.9))
            ThreePointArc((0.135236662, 4.9), (2.235236662, 7), (0.135236662, 9.1))
            Line((0.135236662, 9.1), (-0.864763338, 9.1))
            ThreePointArc((-0.864763338, 9.1), (-2.964763338, 7), (-0.864763338, 4.9))
        make_face()
        with BuildLine():
            Line((14.135236662, 4.9), (15.135236662, 4.9))
            ThreePointArc((15.135236662, 4.9), (17.235236662, 7), (15.135236662, 9.1))
            Line((15.135236662, 9.1), (14.135236662, 9.1))
            ThreePointArc((14.135236662, 9.1), (12.035236662, 7), (14.135236662, 4.9))
        make_face()
        with BuildLine():
            Line((14.135236662, 240.9), (15.135236662, 240.9))
            ThreePointArc((15.135236662, 240.9), (17.235236662, 243), (15.135236662, 245.1))
            Line((15.135236662, 245.1), (14.135236662, 245.1))
            ThreePointArc((14.135236662, 245.1), (12.035236662, 243), (14.135236662, 240.9))
        make_face()
        with BuildLine():
            Line((-0.864763338, 240.9), (0.135236662, 240.9))
            ThreePointArc((0.135236662, 240.9), (2.235236662, 243), (0.135236662, 245.1))
            Line((0.135236662, 245.1), (-0.864763338, 245.1))
            ThreePointArc((-0.864763338, 245.1), (-2.964763338, 243), (-0.864763338, 240.9))
        make_face()
        with BuildLine():
            Line((-15.864763338, 240.9), (-14.864763338, 240.9))
            ThreePointArc((-14.864763338, 240.9), (-12.764763338, 243), (-14.864763338, 245.1))
            Line((-14.864763338, 245.1), (-15.864763338, 245.1))
            ThreePointArc((-15.864763338, 245.1), (-17.964763338, 243), (-15.864763338, 240.9))
        make_face()
    extrude(amount=-CUT_EXTRUDE_6_DEPTH, mode=Mode.SUBTRACT)

    # 草图12 → 切除-拉伸11 (cut)
    with BuildSketch(Plane(origin=(-74.774044662, 0, 0), x_dir=(0, 0, -1), z_dir=(1, 0, 0))):
        with Locations((53.864763338, 125)):
            Rectangle(SKETCH_12_W, SKETCH_12_H)
    extrude(amount=-CUT_EXTRUDE_11_DEPTH, mode=Mode.SUBTRACT)


solid = part.part
